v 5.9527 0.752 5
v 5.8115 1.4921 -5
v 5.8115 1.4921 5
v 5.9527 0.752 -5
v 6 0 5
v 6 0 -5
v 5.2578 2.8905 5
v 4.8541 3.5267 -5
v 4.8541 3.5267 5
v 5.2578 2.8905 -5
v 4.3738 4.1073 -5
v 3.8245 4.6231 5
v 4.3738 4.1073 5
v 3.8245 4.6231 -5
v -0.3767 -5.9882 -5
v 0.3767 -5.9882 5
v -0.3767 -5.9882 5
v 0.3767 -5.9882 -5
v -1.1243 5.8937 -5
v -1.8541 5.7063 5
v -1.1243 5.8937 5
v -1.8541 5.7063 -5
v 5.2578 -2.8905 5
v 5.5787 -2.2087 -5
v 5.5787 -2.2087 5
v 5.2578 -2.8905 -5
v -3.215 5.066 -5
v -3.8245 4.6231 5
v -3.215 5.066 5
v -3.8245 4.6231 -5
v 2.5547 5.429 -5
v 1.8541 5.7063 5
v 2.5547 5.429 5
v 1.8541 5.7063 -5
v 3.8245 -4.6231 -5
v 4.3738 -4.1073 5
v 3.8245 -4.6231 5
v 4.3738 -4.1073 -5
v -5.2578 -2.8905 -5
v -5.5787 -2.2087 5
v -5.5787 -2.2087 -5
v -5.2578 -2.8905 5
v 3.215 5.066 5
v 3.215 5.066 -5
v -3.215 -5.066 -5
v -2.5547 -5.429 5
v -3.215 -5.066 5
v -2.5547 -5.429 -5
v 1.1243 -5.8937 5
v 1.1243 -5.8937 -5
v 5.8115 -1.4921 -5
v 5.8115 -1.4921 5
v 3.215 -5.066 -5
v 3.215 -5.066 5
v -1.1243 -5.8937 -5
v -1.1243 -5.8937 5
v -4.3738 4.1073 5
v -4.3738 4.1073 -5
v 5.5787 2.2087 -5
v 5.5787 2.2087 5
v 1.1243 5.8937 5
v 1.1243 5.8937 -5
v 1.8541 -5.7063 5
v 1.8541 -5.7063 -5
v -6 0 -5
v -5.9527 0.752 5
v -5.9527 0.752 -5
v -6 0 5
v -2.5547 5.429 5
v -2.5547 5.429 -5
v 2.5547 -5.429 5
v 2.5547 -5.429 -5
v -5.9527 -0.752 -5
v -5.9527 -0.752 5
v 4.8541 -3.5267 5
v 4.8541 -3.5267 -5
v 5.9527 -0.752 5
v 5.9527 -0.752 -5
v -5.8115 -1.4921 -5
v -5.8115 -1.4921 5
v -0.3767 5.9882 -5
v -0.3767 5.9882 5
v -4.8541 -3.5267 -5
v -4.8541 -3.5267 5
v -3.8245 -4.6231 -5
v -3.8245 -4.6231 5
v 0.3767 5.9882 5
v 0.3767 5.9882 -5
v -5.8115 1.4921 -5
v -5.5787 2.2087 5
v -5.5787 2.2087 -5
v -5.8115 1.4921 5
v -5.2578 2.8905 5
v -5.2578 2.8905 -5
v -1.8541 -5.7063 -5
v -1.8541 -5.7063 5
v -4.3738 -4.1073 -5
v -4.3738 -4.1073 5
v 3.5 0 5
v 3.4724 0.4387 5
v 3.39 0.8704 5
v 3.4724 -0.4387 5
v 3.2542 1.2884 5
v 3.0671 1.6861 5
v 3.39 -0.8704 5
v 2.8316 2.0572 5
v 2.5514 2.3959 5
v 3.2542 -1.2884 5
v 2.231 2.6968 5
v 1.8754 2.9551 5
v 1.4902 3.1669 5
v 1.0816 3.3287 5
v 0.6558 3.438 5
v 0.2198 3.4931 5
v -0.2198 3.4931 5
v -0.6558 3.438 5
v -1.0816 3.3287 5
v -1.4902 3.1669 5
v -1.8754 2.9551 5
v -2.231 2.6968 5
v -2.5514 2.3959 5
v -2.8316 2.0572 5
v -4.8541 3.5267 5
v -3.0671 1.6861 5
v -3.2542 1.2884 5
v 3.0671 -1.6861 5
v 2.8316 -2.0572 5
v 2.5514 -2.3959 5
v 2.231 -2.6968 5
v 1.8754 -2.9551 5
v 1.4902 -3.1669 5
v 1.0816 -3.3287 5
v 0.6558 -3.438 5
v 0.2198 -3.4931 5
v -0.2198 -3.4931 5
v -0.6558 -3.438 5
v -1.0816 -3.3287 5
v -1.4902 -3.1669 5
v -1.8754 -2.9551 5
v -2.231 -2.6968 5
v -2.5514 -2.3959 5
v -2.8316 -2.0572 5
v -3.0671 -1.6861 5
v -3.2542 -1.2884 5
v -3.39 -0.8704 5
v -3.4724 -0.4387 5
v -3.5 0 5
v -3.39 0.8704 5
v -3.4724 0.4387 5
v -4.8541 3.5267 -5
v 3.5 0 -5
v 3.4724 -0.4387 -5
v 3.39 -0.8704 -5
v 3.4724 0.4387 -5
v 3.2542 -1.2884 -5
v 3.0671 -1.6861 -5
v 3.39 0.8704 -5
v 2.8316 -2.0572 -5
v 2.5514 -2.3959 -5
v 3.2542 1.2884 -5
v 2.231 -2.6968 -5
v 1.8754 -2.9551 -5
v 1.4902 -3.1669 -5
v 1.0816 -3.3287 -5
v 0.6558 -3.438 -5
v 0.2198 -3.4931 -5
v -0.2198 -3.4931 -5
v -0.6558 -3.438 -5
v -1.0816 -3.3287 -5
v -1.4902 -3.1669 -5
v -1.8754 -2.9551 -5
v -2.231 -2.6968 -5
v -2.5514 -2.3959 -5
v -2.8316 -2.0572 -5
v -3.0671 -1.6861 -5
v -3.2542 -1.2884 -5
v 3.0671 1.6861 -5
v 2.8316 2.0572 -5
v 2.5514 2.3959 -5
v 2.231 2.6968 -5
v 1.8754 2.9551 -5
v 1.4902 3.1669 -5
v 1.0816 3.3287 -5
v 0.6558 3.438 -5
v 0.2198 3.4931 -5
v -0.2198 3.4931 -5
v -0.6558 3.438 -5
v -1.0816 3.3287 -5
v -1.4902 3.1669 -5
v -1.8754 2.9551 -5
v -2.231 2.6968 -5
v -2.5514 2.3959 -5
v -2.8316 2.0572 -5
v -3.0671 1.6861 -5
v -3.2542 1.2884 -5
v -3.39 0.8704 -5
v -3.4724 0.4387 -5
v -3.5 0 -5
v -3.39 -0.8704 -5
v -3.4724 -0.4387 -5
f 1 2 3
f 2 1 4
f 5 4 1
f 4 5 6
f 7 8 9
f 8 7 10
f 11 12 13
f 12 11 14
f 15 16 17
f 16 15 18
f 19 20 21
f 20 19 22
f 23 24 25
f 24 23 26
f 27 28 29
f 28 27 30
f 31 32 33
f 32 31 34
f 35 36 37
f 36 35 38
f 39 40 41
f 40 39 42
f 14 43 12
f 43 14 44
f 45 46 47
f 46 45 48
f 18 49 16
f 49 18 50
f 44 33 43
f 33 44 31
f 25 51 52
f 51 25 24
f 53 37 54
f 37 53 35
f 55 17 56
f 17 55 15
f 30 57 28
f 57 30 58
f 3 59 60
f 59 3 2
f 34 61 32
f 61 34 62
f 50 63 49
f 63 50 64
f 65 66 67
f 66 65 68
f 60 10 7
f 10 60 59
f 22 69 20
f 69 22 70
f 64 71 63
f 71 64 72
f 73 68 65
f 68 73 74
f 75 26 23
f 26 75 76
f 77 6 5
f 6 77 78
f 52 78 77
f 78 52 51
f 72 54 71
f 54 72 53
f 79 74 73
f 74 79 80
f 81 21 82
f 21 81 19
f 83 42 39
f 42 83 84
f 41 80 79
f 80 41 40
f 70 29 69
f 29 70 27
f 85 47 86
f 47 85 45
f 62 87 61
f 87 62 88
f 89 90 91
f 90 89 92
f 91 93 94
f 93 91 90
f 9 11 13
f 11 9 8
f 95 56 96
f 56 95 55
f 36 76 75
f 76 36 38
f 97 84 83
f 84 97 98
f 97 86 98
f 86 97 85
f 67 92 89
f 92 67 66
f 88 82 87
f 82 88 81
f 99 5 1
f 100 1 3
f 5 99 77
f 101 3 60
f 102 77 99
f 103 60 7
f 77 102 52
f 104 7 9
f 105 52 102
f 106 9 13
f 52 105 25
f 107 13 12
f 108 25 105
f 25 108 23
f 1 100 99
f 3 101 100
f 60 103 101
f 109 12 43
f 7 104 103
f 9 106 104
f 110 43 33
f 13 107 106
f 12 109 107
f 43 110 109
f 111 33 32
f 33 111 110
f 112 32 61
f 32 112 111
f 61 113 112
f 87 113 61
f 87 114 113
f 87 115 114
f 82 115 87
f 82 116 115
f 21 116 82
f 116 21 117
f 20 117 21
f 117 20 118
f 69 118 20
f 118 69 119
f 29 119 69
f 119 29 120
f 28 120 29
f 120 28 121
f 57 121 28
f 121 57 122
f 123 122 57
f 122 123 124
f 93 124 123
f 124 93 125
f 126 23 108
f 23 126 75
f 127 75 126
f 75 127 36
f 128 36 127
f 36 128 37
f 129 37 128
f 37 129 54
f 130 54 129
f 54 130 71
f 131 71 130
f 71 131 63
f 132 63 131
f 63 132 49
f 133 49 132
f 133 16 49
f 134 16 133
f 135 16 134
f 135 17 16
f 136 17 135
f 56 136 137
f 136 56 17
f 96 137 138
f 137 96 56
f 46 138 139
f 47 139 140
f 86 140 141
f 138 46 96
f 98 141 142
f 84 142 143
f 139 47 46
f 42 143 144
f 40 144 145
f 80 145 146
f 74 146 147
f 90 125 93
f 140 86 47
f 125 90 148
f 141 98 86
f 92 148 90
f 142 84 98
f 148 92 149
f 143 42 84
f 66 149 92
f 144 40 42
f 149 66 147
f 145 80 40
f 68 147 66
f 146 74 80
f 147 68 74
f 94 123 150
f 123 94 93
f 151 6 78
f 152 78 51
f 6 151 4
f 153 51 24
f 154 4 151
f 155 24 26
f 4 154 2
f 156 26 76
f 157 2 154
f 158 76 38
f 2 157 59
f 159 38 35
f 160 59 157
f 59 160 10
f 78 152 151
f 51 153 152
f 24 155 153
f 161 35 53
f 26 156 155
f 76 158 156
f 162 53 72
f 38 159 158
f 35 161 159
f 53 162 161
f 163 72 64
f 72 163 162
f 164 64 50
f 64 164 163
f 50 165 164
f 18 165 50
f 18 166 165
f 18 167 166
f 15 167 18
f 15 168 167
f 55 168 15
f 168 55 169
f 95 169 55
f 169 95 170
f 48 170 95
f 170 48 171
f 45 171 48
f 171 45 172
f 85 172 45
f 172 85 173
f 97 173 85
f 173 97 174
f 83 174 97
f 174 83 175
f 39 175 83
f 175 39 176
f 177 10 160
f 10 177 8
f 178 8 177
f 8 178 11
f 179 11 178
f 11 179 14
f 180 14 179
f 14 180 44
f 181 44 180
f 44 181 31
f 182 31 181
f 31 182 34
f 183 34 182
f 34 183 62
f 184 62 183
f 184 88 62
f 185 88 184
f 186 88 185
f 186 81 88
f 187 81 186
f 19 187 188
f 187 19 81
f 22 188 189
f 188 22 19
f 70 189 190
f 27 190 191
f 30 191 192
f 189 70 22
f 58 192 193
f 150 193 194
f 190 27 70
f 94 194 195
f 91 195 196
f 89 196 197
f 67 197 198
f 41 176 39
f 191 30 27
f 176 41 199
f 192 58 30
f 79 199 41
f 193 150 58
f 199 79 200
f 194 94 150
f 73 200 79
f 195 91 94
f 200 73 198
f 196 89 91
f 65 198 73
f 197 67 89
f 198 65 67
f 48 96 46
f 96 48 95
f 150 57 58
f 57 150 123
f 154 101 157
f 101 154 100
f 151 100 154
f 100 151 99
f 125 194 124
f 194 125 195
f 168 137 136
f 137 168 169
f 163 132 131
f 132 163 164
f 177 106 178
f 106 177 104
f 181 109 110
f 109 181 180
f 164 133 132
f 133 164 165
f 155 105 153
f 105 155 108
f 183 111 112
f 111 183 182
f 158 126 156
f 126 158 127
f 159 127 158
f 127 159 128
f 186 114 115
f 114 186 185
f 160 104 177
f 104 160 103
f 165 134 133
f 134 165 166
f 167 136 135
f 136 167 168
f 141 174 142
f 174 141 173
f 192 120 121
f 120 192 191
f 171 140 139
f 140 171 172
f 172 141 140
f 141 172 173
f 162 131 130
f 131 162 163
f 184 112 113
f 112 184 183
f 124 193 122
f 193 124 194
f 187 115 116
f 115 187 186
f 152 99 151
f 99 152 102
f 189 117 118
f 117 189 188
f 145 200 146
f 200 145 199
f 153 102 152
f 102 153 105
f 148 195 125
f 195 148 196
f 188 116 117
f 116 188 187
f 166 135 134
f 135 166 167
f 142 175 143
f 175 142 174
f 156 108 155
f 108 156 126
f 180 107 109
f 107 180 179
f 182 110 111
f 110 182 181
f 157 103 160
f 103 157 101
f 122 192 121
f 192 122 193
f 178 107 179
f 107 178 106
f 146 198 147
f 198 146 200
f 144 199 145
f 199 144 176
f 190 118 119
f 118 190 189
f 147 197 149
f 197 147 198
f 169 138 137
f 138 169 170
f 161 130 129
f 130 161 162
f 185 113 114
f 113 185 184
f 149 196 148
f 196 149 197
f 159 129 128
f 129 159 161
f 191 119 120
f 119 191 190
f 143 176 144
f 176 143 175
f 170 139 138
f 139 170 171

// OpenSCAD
$fn = 50;


difference() {
	union() {
		translate(v = [0, 0, -5.0000000000]) {
			cylinder(h = 10, r = 6.0000000000);
		}
	}
	union() {
		translate(v = [0, 0, -100.0000000000]) {
			cylinder(h = 200, r = 3.5000000000);
		}
	}
}
